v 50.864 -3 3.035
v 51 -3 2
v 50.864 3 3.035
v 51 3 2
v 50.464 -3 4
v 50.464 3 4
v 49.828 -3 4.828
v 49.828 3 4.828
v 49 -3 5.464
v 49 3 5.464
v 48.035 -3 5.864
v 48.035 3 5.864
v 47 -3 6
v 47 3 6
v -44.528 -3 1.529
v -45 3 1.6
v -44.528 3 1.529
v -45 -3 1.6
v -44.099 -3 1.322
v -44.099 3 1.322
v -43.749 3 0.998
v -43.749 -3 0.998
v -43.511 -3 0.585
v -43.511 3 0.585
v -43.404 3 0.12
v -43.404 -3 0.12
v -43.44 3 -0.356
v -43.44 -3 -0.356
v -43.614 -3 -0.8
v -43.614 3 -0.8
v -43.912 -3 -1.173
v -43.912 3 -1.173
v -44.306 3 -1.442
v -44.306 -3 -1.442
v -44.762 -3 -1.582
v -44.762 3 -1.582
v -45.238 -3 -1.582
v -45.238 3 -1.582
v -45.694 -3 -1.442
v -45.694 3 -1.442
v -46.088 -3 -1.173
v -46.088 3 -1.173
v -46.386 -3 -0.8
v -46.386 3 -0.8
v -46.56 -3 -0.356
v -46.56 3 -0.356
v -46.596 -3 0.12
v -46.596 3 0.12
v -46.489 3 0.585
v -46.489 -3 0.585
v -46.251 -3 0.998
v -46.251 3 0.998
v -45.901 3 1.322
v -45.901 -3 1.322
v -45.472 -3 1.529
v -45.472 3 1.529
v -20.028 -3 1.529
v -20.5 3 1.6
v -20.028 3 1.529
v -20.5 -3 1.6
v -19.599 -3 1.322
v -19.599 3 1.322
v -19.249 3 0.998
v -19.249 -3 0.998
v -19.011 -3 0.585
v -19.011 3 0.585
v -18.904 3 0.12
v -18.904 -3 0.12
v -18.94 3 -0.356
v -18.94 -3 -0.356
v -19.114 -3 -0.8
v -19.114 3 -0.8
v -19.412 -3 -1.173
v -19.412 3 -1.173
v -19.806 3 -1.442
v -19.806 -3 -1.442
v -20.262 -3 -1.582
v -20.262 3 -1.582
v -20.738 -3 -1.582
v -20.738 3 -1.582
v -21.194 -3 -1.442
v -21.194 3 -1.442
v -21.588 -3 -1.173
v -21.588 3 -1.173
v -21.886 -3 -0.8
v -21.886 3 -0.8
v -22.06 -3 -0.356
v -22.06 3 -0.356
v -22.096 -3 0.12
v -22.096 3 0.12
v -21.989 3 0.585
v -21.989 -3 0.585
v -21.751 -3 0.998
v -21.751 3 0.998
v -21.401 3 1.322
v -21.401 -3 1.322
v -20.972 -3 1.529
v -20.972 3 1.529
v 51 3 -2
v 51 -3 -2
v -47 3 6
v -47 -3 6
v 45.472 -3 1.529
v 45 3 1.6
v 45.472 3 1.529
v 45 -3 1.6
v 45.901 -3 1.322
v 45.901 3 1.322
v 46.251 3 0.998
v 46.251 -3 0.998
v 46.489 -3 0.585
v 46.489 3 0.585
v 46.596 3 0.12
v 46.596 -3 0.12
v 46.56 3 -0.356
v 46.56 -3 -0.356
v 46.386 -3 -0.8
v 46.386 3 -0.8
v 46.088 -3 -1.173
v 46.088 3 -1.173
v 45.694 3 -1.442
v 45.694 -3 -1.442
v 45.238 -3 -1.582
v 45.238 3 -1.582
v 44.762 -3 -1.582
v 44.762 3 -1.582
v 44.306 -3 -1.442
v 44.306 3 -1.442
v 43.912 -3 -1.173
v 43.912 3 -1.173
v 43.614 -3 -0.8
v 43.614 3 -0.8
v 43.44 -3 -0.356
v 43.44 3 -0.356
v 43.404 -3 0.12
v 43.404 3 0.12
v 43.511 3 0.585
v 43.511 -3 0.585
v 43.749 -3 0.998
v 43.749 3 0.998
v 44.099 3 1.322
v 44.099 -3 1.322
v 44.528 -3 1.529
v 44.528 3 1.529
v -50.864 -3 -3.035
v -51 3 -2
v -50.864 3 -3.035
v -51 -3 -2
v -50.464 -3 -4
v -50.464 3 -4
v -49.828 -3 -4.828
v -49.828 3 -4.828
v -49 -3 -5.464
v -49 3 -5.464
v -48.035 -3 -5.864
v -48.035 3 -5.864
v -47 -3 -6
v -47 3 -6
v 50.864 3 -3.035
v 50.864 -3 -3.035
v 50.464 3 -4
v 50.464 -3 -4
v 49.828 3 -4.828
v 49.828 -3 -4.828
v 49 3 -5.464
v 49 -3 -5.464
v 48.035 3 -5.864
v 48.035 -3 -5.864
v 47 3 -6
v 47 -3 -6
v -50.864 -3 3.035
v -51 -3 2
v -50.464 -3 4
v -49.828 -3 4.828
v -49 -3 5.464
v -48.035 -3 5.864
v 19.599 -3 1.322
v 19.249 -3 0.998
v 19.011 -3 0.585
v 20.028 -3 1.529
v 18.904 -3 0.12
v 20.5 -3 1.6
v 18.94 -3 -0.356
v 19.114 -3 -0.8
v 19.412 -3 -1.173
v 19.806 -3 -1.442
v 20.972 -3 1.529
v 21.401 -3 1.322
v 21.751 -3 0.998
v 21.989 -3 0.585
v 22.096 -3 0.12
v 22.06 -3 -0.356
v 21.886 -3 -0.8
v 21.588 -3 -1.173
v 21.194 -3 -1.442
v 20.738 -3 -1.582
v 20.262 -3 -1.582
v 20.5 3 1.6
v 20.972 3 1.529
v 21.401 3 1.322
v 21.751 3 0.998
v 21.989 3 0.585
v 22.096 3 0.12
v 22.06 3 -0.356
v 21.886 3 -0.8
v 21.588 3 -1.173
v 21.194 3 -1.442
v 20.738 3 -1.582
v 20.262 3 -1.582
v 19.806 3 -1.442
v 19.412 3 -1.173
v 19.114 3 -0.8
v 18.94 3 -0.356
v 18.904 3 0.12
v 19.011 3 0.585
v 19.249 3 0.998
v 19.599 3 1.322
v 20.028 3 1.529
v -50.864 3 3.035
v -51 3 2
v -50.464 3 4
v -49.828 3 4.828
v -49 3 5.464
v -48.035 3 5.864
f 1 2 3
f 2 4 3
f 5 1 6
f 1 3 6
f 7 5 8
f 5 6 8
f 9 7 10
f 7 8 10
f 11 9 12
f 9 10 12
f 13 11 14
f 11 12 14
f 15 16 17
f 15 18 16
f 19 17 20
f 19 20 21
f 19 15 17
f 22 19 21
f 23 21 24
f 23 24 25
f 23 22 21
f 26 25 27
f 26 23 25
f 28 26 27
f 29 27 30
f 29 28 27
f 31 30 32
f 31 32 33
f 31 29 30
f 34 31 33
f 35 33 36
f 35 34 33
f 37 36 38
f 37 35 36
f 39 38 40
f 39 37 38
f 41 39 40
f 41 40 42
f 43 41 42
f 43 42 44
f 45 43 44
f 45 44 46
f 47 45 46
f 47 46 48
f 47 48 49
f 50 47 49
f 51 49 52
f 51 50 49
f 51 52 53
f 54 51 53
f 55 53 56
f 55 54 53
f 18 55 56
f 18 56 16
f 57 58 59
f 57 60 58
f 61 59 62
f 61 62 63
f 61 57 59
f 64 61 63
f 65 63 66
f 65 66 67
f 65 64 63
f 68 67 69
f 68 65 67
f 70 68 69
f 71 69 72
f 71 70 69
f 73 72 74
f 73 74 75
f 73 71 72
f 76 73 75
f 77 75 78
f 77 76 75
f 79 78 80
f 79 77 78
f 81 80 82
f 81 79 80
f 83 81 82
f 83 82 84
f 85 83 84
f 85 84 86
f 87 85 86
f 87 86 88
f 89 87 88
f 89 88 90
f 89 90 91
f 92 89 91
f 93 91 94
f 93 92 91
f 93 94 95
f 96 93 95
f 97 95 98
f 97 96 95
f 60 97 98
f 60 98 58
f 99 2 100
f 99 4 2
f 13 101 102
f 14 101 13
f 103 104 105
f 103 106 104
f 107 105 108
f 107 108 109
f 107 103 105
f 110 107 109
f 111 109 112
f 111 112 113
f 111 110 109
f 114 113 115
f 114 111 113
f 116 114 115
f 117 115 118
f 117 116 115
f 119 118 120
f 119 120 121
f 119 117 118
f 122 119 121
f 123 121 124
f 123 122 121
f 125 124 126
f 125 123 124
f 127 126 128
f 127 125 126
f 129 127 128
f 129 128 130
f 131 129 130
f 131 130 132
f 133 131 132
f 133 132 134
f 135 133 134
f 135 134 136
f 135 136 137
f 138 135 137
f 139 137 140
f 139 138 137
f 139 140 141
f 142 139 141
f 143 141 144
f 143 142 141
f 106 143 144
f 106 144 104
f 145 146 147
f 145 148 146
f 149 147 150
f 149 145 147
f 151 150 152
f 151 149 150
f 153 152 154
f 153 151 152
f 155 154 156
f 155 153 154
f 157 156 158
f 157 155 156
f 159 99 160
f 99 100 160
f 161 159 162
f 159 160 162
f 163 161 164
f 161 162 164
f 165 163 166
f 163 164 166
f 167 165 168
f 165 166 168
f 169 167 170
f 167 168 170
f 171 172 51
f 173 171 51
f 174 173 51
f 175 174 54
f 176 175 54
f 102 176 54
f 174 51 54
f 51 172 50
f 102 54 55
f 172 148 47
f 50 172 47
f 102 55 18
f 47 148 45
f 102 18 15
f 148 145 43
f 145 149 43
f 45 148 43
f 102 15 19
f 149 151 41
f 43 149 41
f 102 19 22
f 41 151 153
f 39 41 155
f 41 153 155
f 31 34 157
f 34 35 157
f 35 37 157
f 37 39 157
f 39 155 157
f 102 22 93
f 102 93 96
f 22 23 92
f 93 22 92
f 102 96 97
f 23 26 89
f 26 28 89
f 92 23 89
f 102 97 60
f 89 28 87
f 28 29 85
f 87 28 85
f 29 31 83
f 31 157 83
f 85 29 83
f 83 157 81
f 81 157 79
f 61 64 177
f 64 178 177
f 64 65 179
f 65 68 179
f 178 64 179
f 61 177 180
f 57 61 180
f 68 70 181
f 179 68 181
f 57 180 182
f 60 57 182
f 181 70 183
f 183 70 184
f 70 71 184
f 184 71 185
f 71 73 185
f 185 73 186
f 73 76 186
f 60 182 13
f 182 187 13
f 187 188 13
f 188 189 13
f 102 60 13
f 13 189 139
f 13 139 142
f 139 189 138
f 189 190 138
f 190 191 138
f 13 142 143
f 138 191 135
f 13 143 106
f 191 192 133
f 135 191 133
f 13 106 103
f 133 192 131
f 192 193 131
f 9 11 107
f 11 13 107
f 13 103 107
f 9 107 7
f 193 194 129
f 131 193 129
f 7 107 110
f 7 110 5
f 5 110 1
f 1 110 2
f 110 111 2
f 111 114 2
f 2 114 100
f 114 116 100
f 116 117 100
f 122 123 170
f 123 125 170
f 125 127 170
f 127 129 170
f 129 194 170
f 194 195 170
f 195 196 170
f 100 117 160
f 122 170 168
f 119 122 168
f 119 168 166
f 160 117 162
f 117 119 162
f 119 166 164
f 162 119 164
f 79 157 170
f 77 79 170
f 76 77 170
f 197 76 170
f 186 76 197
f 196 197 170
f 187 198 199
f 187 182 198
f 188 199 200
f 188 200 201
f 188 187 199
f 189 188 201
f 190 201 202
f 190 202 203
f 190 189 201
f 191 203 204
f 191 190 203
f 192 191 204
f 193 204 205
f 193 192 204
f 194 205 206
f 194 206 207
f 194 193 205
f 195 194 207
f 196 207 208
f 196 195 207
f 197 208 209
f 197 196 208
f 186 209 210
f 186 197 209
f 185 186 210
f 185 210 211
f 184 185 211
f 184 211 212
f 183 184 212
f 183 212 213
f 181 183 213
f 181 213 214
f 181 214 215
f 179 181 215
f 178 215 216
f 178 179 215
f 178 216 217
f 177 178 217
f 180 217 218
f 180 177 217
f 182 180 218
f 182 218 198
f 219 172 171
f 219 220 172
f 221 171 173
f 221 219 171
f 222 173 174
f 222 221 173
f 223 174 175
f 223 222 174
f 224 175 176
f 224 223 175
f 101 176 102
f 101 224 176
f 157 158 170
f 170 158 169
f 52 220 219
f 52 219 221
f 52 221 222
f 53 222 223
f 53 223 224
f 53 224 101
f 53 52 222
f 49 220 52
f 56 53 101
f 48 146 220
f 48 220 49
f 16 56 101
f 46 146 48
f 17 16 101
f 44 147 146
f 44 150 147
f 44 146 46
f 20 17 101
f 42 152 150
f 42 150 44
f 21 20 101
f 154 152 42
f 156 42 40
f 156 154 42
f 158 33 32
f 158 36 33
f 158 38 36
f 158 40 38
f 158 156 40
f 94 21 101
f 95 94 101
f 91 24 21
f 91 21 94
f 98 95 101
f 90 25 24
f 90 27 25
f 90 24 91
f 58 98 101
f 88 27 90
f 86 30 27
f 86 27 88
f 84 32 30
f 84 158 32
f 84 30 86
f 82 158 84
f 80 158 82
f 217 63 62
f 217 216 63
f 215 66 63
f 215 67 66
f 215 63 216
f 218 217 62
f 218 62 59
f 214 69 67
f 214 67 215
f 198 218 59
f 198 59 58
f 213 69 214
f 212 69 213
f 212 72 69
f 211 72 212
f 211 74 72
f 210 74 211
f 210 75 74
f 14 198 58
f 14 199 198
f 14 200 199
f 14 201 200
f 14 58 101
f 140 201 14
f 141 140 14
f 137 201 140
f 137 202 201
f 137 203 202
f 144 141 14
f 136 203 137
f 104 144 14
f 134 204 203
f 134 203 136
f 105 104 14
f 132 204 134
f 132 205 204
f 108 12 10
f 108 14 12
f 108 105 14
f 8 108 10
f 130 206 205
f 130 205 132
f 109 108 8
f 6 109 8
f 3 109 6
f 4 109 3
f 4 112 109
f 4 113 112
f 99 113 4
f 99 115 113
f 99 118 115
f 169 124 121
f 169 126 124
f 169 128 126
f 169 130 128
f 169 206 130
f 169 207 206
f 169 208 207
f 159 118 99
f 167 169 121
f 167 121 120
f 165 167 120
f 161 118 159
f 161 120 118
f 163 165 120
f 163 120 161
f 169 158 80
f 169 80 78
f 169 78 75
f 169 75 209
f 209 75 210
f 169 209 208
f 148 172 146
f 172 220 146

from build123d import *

# Parameters (mm, degrees)
SKETCH1_W           = 102
SKETCH1_H           = 12
SKETCH1_R           = 1.6
BOSS_EXTRUDE1_DEPTH = 3
FILLET1_R           = 4


with BuildPart() as part:
    # Sketch1 → Boss-Extrude1 (new, symmetric)
    with BuildSketch(Plane(origin=(0, 0, 0), x_dir=(1, 0, 0), z_dir=(0, 1, 0))):
        Rectangle(SKETCH1_W, SKETCH1_H)
        with Locations(Location((-45, 0, 0), (0, 0, 270))):
            Circle(SKETCH1_R, mode=Mode.SUBTRACT)
        with Locations(Location((-20.5, 0, 0), (0, 0, 270))):
            Circle(SKETCH1_R, mode=Mode.SUBTRACT)
        with Locations(Location((20.5, 0, 0), (0, 0, 270))):
            Circle(SKETCH1_R, mode=Mode.SUBTRACT)
        with Locations(Location((45, 0, 0), (0, 0, 270))):
            Circle(SKETCH1_R, mode=Mode.SUBTRACT)
    extrude(amount=BOSS_EXTRUDE1_DEPTH, both=True)

    # Fillet1
    fillet1_edges = [part.edges().sort_by_distance(p)[0] for p in [
        (51, 0, 6),
        (-51, 0, 6),
        (-51, 0, -6),
        (51, 0, -6),
    ]]
    fillet(fillet1_edges, radius=FILLET1_R)


solid = part.part
